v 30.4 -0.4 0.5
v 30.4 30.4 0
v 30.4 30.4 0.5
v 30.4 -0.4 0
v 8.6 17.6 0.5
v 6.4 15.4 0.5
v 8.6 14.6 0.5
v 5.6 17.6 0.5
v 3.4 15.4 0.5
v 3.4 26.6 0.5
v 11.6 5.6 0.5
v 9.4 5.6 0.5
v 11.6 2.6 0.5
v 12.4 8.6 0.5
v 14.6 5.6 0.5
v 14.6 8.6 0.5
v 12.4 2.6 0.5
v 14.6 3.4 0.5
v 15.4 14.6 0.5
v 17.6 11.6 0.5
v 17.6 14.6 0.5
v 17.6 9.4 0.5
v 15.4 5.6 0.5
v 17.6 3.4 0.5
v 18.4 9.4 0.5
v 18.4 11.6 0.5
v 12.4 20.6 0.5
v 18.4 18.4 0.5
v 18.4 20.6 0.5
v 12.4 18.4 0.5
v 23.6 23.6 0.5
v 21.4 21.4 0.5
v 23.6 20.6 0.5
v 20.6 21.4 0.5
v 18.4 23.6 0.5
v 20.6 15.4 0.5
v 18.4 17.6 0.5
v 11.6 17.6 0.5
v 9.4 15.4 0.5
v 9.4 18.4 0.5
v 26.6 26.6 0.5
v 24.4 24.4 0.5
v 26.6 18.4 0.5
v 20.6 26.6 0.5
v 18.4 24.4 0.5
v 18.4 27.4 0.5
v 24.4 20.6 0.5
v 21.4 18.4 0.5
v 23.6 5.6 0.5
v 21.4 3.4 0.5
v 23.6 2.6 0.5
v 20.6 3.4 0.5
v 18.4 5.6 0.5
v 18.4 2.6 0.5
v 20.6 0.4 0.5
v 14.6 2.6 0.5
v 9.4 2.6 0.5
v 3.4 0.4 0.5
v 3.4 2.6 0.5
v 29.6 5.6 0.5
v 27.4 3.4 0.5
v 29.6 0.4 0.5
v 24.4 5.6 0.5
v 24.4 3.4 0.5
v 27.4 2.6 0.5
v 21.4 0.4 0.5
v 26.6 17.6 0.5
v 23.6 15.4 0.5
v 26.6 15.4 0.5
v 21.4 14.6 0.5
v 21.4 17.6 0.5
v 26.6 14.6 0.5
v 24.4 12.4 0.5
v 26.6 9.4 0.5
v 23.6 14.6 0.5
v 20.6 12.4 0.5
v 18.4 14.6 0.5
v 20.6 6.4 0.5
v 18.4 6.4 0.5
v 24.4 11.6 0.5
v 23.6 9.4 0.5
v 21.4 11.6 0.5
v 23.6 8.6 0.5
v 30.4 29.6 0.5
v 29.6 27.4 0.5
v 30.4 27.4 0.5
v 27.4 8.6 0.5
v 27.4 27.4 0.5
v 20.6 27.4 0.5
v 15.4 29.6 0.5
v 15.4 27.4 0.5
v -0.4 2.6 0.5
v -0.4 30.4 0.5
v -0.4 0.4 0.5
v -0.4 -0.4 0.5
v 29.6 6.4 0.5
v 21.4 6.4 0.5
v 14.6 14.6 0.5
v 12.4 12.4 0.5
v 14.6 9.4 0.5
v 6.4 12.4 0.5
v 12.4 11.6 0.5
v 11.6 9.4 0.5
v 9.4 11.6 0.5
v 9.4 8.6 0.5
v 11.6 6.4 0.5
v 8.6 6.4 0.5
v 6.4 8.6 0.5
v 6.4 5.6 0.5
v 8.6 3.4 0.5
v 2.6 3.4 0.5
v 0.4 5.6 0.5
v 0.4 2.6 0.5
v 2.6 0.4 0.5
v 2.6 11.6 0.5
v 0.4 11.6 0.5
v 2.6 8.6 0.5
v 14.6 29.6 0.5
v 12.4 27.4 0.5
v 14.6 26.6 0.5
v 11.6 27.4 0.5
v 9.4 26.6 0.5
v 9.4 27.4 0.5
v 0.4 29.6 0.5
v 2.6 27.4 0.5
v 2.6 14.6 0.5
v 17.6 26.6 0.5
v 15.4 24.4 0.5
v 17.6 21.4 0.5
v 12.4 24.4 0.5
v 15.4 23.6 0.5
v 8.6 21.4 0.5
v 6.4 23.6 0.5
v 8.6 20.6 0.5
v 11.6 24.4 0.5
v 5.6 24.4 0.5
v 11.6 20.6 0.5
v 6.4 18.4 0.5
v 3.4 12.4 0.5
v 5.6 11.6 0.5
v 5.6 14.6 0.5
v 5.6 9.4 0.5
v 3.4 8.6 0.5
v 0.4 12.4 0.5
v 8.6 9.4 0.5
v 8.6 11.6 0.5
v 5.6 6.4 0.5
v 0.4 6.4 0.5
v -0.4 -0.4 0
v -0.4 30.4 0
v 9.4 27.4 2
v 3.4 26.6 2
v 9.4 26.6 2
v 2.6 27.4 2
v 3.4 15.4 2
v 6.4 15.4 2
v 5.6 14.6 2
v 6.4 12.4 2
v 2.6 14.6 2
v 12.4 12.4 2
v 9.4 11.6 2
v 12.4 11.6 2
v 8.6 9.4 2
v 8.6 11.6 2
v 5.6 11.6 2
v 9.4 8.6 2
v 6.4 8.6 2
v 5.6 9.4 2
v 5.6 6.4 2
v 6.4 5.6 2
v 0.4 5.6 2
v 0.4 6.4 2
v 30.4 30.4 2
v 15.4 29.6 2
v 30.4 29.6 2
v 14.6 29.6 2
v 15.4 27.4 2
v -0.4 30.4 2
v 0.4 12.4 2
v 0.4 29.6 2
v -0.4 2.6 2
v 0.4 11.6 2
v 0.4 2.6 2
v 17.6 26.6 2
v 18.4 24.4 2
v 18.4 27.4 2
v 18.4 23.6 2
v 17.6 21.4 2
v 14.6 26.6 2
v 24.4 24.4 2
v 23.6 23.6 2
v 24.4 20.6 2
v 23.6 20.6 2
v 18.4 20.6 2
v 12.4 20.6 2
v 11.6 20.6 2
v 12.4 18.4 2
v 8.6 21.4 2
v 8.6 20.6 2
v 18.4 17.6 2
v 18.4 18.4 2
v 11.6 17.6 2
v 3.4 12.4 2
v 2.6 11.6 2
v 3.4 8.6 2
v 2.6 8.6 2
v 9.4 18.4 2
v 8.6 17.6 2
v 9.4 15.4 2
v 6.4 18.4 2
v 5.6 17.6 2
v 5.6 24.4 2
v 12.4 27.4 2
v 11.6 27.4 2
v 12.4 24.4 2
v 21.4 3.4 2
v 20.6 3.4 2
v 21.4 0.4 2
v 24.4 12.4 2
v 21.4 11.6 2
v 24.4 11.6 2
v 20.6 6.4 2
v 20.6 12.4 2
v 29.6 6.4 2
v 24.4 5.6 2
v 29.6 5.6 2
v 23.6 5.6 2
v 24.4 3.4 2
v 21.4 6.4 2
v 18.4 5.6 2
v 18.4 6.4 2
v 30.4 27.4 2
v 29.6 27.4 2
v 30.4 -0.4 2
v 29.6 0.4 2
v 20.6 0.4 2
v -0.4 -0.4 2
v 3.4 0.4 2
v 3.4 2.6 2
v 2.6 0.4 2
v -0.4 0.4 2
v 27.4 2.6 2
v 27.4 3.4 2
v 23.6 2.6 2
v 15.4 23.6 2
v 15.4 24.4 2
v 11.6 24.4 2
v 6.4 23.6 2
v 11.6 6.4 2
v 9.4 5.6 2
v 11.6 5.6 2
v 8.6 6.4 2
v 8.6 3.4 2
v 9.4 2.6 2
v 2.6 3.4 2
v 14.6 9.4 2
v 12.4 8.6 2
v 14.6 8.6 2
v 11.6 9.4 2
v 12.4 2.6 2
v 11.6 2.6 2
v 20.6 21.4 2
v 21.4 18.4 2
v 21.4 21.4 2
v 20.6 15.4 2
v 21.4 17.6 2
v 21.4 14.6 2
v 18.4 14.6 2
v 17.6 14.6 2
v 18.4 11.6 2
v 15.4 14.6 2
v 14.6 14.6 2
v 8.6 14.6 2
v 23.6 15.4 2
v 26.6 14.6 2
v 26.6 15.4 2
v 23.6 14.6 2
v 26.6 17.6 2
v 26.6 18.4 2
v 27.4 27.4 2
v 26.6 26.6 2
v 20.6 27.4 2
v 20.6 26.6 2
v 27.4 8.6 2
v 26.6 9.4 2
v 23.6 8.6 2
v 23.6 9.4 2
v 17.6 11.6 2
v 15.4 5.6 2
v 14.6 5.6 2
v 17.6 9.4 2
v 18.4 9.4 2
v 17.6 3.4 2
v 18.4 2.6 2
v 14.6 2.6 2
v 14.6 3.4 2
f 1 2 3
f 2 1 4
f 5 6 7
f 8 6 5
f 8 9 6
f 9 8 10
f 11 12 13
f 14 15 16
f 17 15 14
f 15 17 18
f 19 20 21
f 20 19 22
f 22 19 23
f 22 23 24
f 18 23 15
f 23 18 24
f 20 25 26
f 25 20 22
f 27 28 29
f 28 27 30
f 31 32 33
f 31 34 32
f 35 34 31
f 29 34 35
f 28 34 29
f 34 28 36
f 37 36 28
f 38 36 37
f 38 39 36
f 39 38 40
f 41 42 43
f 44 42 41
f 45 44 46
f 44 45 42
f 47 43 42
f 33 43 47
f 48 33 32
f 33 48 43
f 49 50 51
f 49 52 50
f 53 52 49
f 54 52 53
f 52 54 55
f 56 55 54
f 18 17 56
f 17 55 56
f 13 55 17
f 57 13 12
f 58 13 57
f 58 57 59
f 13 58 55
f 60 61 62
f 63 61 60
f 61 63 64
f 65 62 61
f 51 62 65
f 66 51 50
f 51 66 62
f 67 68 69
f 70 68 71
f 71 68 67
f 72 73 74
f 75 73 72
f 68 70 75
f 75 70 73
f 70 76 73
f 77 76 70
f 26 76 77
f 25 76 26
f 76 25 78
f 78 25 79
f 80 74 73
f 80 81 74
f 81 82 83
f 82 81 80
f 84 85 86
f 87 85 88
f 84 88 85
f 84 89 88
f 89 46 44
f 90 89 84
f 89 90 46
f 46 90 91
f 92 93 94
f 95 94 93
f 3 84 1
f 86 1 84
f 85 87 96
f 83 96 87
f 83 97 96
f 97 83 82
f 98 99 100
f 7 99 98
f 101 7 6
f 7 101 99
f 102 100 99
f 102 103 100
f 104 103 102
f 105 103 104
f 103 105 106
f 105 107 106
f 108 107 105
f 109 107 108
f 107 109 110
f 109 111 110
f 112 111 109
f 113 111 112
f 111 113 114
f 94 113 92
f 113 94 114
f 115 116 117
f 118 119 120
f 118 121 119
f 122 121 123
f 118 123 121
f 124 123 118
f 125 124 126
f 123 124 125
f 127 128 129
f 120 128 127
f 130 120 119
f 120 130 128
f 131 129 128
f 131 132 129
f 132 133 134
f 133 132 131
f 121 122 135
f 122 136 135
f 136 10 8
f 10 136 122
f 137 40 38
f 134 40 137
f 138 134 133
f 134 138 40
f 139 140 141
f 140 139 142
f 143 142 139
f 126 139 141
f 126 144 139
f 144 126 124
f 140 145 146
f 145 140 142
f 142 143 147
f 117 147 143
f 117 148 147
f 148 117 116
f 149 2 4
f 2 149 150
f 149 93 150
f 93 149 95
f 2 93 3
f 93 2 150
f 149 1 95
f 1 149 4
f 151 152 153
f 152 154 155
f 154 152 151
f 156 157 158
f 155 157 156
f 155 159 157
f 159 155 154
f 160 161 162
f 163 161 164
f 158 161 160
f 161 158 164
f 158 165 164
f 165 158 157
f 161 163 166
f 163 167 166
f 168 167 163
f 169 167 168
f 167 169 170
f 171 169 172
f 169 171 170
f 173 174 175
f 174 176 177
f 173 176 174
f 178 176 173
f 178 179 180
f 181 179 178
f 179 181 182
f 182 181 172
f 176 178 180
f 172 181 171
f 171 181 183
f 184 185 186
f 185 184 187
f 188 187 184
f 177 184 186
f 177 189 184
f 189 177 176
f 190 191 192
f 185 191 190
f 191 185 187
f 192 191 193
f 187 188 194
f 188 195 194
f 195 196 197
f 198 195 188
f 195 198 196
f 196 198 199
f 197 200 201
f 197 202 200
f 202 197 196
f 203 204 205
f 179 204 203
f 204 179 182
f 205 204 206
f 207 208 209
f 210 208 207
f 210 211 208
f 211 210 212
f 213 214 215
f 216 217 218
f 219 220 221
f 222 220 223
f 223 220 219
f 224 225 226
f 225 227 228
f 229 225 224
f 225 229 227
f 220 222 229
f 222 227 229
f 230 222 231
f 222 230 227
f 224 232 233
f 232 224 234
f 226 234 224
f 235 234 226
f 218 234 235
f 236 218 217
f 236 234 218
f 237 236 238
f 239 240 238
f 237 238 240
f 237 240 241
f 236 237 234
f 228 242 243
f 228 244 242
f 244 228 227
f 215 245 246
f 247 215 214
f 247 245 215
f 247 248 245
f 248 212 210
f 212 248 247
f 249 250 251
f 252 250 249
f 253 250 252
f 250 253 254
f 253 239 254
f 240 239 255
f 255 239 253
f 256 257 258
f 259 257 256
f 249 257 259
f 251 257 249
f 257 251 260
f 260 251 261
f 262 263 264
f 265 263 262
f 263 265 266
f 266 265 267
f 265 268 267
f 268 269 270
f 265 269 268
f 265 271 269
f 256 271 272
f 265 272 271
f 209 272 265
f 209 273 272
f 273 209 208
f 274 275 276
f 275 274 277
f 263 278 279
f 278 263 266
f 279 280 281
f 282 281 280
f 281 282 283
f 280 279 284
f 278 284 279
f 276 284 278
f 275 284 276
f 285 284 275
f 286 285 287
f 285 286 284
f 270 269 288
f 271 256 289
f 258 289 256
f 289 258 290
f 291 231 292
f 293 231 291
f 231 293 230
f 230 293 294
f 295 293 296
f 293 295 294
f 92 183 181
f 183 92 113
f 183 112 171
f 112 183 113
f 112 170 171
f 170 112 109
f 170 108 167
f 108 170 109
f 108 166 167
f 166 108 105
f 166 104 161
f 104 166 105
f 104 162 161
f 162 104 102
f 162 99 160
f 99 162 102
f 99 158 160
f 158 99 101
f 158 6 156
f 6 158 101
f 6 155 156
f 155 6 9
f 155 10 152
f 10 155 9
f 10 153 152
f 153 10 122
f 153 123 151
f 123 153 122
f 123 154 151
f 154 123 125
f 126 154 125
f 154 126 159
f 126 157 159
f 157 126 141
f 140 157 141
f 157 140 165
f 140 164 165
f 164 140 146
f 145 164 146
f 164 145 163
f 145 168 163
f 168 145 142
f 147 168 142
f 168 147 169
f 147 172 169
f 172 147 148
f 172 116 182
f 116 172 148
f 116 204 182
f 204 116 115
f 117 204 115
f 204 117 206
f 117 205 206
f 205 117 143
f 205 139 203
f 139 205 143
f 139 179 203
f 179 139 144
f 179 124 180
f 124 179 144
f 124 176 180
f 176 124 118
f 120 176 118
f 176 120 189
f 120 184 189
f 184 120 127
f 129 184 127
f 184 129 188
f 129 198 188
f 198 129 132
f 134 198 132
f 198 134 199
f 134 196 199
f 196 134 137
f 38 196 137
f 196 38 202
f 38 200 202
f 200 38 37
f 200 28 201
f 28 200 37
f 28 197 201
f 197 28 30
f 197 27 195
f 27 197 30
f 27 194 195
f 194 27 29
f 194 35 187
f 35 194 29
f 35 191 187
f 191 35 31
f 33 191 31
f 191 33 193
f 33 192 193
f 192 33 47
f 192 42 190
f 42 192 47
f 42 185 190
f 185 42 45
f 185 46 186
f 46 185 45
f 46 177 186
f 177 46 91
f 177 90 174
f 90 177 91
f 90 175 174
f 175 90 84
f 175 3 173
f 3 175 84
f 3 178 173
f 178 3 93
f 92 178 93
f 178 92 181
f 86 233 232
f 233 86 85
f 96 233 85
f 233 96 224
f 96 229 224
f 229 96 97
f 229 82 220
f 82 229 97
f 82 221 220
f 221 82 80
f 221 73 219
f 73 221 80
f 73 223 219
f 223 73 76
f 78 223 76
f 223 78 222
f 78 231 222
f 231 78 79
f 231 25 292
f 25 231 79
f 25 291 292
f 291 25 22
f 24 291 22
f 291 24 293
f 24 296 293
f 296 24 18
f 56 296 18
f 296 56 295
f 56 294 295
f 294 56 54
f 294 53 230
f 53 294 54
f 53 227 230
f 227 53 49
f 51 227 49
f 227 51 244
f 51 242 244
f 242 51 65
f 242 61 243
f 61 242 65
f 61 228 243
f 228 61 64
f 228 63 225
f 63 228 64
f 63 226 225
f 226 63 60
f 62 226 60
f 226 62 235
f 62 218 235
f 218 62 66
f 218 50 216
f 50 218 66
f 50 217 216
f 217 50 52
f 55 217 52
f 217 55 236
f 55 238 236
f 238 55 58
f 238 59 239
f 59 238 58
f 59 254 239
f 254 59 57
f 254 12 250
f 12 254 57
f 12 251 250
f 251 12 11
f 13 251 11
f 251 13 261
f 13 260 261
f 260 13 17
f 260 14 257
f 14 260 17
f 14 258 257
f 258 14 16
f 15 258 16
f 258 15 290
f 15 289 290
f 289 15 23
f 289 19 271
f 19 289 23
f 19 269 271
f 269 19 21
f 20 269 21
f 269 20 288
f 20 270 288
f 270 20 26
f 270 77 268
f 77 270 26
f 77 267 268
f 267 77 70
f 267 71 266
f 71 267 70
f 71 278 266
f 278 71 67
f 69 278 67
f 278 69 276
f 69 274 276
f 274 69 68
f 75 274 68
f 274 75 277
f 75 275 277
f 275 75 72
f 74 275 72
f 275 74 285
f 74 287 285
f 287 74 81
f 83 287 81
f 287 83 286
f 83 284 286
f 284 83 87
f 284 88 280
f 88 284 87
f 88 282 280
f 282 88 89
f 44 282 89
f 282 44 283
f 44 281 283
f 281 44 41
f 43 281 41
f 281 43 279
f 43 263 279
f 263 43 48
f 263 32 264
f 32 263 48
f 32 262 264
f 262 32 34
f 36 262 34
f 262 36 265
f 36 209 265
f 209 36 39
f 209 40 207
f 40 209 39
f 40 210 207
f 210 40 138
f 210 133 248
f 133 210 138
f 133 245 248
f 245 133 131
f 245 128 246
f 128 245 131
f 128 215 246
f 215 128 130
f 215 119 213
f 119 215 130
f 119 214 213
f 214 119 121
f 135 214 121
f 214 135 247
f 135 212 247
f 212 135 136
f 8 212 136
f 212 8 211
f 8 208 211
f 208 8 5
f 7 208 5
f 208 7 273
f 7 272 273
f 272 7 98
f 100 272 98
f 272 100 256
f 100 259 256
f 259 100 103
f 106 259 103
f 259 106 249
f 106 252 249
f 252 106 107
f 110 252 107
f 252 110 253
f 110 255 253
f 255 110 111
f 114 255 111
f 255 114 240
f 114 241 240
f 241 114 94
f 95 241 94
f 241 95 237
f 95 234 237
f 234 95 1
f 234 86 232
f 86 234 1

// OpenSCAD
//random maze generator with back
//Mark G. Peeters added back and commnents 1-12-16
//http://www.thingiverse.com/thing:1264082
//Original work by JustinSDK
//https://www.thingiverse.com/thing:1185425
//preview[view:south, tilt:top]
//Y direction
rows = 10;
//x direction
columns = 10;

wall_thickness = 0.8;
wall_height = 2;
block_width = 3;
base_thickness=0.5;

/*hidden*/
echo("maze size X=",columns*block_width+wall_thickness);
echo("maze size Y=",rows*block_width+wall_thickness);
echo("maze path width=",block_width-wall_thickness);
translate([-wall_thickness/2,-wall_thickness/2,0])cube([columns*block_width+wall_thickness,rows*block_width+wall_thickness,base_thickness]);


/*
 * constants, for clearness
 *
 */
 #translate([-wall_thickness/2,-wall_thickness/2,0])cube([columns*block_width+wall_thickness,rows*block_width+wall_thickness,base_thickness]);
 
 
// random directions, for picking up a direction to visit the next block
function PERMUTATION_OF_FOUR() = [
    [1, 2, 3, 4],
    [1, 2, 4, 3],
    [1, 3, 2, 4],
    [1, 3, 4, 2],
    [1, 4, 2, 3],
    [1, 4, 3, 2],
    [2, 1, 3, 4],
    [2, 1, 4, 3],
    [2, 3, 1, 4],
    [2, 3, 4, 1],
    [2, 4, 1, 3],
    [2, 4, 3, 1],
    [3, 1, 2, 4],
    [3, 1, 4, 2],
    [3, 2, 1, 4],
    [3, 2, 4, 1],
    [3, 4, 1, 2],
    [3, 4, 2, 1],
    [4, 1, 2, 3],
    [4, 1, 3, 2],
    [4, 2, 1, 3],
    [4, 2, 3, 1],
    [4, 3, 1, 2],
    [4, 3, 2, 1]
];

function NO_WALL() = 0;
function UP_WALL() = 1;
function RIGHT_WALL() = 2;
function UP_RIGHT_WALL() = 3;

function NOT_VISITED() = 0;
function VISITED() = 1;

/* 
 * modules for creating a maze
 *
 */

// give a [x, y] point and length. draw a line in the x direction
module x_line(point, length, thickness = 1) {
    offset = thickness / 2;
    translate([point[0] - offset, point[1] - offset, 0]) 
        square([length + thickness, thickness]);
}

// give a [x, y] point and length. draw a line in the y direction
module y_line(point, length, thickness = 1) {
    offset = thickness / 2;
    translate([point[0] - offset, point[1] - offset, 0])  
        square([thickness, length + thickness]);
}

// create the outer wall of maze
module maze_outer_wall(rows, columns, block_width = 5, wall_thickness = 1) {
    x_line([0, rows * block_width], columns * block_width, wall_thickness);
    y_line([0, block_width], (rows - 1) * block_width, wall_thickness);
}

// create the inner wall of maze
module maze_inner_wall(maze, block_width = 5, wall_thickness = 1) {
    for(i = [0:len(maze) - 1]) {
        cord = maze[i];
        x = (cord[0] - 1) * block_width;
        y = (cord[1] - 1) * block_width;
        v = cord[3];
        
        if(v == 1 || v == 3) {
            x_line([x, y], block_width, wall_thickness);
        }
        if(v == 2 || v == 3) {
            y_line([x + block_width, y], block_width, wall_thickness);
        }
    }  
}

// create a maze
module maze(rows, columns, maze_vector, block_width = 5, wall_thickness = 1) {
     maze_outer_wall(rows, columns, block_width, wall_thickness);
     maze_inner_wall(maze_vector, block_width, wall_thickness);
}

/* 
 * utilities functions
 *
 */

// comare the equality of [x1, y1] and [x2, y2]
function cord_equals(cord1, cord2) = cord1 == cord2;

// is the point visited?
function not_visited(cord, vs, index = 0) =
    index == len(vs) ? true : 
        (cord_equals([vs[index][0], vs[index][1]], cord) && vs[index][2] == 1 ? false :
            not_visited(cord, vs, index + 1));
            
// pick a direction randomly
function rand_dirs() =
    PERMUTATION_OF_FOUR()[round(rands(0, 24, 1)[0])]; 

// give a index (exclusivly), slice a vector 
function head_to(i, vs) =
    i >= len(vs) ? vs : (
        i == 0 ? [] : concat(head_to(i - 1, vs), [vs[i - 1]])
    );

// give a index (exclusivly), slice a vector 
function tail_from(i, vs, index = 0, new_vs = []) =
    i >= len(vs) ? [] : (
        index < i ? tail_from(i, vs, index + 1) : (
            index < len(vs) ? tail_from(i, vs, index + 1, concat(new_vs, [vs[index]])) : new_vs
        )
    );

// replace v1 in the vector with v2 
function replace(v1, v2, vs, index = 0) =
    index == len(vs) ? vs : (
        vs[index] == v1 ? concat(concat(head_to(index, vs), [v2]), tail_from(index + 1, vs)) : replace(v1, v2, vs, index + 1)
    );
    
/* 
 * functions for generating a maze vector
 *
 */

// initialize rows of a maze
function init_row(n, length) =
    length == 0 ? [] : concat(init_row(n, length - 1), [[length, n, 0, UP_RIGHT_WALL()]]);
    
// initialize a maze
function init_maze(rows, columns) =
    rows == 0 ? [] : concat(init_maze(rows - 1, columns), init_row(rows, columns));
    
// find a vector in the maze vector
function find(i, j, maze_vector, index = 0) =
    index == len(maze_vector) ? [] : (
        cord_equals([i, j], [maze_vector[index][0], maze_vector[index][1]]) ? maze_vector[index] : find(i, j, maze_vector, index + 1)
    );

////
// NO_WALL = 0;
// UP_WALL = 1;
// RIGHT_WALL = 2;
// UP_RIGHT_WALL = 3;
function delete_right_wall(original_block) = 
    original_block == NO_WALL() || original_block == RIGHT_WALL() ? NO_WALL() : UP_WALL();

function delete_up_wall(original_block) = 
    (original_block == NO_WALL() || original_block == UP_WALL()) ? NO_WALL() : RIGHT_WALL();
    
function delete_right_wall_of(vs, is_visited, maze_vector) =
    replace(vs, [vs[0], vs[1] , is_visited, delete_right_wall(vs[3])] ,maze_vector);

function delete_up_wall_of(vs, is_visited, maze_vector) =
    replace(vs, [vs[0], vs[1] , is_visited, delete_up_wall(vs[3])] ,maze_vector);

function go_right(i, j, rows, columns, maze_vector) =
    go_maze(i + 1, j, rows, columns, delete_right_wall_of(find(i, j, maze_vector), VISITED(), maze_vector));
    
function go_up(i, j, rows, columns, maze_vector) =
    go_maze(i, j - 1, rows, columns, delete_up_wall_of(find(i, j, maze_vector), VISITED(), maze_vector));
    
function visit(v, maze_vector) =
    replace(v, [v[0], v[1], VISITED(), v[3]], maze_vector);
 
function go_left(i, j, rows, columns, maze_vector) =
    go_maze(i - 1, j, rows, columns, delete_right_wall_of(find(i - 1, j, maze_vector), NOT_VISITED(), maze_vector));
    
function go_down(i, j, rows, columns, maze_vector) =
    go_maze(i, j + 1, rows, columns, delete_up_wall_of(find(i, j + 1, maze_vector), NOT_VISITED(), maze_vector));
    
function go_maze(i, j, rows, columns, maze_vector) =
    look_around(i, j, rand_dirs(), rows, columns, visit(find(i, j, maze_vector), maze_vector));
    
function look_around(i, j, dirs, rows, columns, maze_vector, index = 0) =
    index == 4 ? maze_vector : 
        look_around( 
            i, j, dirs, 
            rows, columns, 
            build_wall(i, j, dirs[index], rows, columns, maze_vector), 
            index + 1
        ); 

function build_wall(i, j, n, rows, columns, maze_vector) = 
    n == 1 && i != columns && not_visited([i + 1, j], maze_vector) ? go_right(i, j, rows, columns, maze_vector) : ( 
        n == 2 && j != 1 && not_visited([i, j - 1], maze_vector) ? go_up(i, j, rows, columns, maze_vector)  : (
            n == 3 && i != 1 && not_visited([i - 1, j], maze_vector) ? go_left(i, j,rows, columns,  maze_vector)  : (
                n == 4 && j != rows && not_visited([i, j + 1], maze_vector) ? go_down(i, j, rows, columns, maze_vector) : maze_vector
            ) 
        )
    ); 
 
/*
 * create a maze
 *
 */
maze_vector = go_maze(1, 1, rows, columns, replace([columns, rows, 0, UP_RIGHT_WALL()], [columns, rows, 0, UP_WALL()], init_maze(rows, columns)));
linear_extrude(wall_height) 
    maze(rows, columns, maze_vector, block_width, wall_thickness);
